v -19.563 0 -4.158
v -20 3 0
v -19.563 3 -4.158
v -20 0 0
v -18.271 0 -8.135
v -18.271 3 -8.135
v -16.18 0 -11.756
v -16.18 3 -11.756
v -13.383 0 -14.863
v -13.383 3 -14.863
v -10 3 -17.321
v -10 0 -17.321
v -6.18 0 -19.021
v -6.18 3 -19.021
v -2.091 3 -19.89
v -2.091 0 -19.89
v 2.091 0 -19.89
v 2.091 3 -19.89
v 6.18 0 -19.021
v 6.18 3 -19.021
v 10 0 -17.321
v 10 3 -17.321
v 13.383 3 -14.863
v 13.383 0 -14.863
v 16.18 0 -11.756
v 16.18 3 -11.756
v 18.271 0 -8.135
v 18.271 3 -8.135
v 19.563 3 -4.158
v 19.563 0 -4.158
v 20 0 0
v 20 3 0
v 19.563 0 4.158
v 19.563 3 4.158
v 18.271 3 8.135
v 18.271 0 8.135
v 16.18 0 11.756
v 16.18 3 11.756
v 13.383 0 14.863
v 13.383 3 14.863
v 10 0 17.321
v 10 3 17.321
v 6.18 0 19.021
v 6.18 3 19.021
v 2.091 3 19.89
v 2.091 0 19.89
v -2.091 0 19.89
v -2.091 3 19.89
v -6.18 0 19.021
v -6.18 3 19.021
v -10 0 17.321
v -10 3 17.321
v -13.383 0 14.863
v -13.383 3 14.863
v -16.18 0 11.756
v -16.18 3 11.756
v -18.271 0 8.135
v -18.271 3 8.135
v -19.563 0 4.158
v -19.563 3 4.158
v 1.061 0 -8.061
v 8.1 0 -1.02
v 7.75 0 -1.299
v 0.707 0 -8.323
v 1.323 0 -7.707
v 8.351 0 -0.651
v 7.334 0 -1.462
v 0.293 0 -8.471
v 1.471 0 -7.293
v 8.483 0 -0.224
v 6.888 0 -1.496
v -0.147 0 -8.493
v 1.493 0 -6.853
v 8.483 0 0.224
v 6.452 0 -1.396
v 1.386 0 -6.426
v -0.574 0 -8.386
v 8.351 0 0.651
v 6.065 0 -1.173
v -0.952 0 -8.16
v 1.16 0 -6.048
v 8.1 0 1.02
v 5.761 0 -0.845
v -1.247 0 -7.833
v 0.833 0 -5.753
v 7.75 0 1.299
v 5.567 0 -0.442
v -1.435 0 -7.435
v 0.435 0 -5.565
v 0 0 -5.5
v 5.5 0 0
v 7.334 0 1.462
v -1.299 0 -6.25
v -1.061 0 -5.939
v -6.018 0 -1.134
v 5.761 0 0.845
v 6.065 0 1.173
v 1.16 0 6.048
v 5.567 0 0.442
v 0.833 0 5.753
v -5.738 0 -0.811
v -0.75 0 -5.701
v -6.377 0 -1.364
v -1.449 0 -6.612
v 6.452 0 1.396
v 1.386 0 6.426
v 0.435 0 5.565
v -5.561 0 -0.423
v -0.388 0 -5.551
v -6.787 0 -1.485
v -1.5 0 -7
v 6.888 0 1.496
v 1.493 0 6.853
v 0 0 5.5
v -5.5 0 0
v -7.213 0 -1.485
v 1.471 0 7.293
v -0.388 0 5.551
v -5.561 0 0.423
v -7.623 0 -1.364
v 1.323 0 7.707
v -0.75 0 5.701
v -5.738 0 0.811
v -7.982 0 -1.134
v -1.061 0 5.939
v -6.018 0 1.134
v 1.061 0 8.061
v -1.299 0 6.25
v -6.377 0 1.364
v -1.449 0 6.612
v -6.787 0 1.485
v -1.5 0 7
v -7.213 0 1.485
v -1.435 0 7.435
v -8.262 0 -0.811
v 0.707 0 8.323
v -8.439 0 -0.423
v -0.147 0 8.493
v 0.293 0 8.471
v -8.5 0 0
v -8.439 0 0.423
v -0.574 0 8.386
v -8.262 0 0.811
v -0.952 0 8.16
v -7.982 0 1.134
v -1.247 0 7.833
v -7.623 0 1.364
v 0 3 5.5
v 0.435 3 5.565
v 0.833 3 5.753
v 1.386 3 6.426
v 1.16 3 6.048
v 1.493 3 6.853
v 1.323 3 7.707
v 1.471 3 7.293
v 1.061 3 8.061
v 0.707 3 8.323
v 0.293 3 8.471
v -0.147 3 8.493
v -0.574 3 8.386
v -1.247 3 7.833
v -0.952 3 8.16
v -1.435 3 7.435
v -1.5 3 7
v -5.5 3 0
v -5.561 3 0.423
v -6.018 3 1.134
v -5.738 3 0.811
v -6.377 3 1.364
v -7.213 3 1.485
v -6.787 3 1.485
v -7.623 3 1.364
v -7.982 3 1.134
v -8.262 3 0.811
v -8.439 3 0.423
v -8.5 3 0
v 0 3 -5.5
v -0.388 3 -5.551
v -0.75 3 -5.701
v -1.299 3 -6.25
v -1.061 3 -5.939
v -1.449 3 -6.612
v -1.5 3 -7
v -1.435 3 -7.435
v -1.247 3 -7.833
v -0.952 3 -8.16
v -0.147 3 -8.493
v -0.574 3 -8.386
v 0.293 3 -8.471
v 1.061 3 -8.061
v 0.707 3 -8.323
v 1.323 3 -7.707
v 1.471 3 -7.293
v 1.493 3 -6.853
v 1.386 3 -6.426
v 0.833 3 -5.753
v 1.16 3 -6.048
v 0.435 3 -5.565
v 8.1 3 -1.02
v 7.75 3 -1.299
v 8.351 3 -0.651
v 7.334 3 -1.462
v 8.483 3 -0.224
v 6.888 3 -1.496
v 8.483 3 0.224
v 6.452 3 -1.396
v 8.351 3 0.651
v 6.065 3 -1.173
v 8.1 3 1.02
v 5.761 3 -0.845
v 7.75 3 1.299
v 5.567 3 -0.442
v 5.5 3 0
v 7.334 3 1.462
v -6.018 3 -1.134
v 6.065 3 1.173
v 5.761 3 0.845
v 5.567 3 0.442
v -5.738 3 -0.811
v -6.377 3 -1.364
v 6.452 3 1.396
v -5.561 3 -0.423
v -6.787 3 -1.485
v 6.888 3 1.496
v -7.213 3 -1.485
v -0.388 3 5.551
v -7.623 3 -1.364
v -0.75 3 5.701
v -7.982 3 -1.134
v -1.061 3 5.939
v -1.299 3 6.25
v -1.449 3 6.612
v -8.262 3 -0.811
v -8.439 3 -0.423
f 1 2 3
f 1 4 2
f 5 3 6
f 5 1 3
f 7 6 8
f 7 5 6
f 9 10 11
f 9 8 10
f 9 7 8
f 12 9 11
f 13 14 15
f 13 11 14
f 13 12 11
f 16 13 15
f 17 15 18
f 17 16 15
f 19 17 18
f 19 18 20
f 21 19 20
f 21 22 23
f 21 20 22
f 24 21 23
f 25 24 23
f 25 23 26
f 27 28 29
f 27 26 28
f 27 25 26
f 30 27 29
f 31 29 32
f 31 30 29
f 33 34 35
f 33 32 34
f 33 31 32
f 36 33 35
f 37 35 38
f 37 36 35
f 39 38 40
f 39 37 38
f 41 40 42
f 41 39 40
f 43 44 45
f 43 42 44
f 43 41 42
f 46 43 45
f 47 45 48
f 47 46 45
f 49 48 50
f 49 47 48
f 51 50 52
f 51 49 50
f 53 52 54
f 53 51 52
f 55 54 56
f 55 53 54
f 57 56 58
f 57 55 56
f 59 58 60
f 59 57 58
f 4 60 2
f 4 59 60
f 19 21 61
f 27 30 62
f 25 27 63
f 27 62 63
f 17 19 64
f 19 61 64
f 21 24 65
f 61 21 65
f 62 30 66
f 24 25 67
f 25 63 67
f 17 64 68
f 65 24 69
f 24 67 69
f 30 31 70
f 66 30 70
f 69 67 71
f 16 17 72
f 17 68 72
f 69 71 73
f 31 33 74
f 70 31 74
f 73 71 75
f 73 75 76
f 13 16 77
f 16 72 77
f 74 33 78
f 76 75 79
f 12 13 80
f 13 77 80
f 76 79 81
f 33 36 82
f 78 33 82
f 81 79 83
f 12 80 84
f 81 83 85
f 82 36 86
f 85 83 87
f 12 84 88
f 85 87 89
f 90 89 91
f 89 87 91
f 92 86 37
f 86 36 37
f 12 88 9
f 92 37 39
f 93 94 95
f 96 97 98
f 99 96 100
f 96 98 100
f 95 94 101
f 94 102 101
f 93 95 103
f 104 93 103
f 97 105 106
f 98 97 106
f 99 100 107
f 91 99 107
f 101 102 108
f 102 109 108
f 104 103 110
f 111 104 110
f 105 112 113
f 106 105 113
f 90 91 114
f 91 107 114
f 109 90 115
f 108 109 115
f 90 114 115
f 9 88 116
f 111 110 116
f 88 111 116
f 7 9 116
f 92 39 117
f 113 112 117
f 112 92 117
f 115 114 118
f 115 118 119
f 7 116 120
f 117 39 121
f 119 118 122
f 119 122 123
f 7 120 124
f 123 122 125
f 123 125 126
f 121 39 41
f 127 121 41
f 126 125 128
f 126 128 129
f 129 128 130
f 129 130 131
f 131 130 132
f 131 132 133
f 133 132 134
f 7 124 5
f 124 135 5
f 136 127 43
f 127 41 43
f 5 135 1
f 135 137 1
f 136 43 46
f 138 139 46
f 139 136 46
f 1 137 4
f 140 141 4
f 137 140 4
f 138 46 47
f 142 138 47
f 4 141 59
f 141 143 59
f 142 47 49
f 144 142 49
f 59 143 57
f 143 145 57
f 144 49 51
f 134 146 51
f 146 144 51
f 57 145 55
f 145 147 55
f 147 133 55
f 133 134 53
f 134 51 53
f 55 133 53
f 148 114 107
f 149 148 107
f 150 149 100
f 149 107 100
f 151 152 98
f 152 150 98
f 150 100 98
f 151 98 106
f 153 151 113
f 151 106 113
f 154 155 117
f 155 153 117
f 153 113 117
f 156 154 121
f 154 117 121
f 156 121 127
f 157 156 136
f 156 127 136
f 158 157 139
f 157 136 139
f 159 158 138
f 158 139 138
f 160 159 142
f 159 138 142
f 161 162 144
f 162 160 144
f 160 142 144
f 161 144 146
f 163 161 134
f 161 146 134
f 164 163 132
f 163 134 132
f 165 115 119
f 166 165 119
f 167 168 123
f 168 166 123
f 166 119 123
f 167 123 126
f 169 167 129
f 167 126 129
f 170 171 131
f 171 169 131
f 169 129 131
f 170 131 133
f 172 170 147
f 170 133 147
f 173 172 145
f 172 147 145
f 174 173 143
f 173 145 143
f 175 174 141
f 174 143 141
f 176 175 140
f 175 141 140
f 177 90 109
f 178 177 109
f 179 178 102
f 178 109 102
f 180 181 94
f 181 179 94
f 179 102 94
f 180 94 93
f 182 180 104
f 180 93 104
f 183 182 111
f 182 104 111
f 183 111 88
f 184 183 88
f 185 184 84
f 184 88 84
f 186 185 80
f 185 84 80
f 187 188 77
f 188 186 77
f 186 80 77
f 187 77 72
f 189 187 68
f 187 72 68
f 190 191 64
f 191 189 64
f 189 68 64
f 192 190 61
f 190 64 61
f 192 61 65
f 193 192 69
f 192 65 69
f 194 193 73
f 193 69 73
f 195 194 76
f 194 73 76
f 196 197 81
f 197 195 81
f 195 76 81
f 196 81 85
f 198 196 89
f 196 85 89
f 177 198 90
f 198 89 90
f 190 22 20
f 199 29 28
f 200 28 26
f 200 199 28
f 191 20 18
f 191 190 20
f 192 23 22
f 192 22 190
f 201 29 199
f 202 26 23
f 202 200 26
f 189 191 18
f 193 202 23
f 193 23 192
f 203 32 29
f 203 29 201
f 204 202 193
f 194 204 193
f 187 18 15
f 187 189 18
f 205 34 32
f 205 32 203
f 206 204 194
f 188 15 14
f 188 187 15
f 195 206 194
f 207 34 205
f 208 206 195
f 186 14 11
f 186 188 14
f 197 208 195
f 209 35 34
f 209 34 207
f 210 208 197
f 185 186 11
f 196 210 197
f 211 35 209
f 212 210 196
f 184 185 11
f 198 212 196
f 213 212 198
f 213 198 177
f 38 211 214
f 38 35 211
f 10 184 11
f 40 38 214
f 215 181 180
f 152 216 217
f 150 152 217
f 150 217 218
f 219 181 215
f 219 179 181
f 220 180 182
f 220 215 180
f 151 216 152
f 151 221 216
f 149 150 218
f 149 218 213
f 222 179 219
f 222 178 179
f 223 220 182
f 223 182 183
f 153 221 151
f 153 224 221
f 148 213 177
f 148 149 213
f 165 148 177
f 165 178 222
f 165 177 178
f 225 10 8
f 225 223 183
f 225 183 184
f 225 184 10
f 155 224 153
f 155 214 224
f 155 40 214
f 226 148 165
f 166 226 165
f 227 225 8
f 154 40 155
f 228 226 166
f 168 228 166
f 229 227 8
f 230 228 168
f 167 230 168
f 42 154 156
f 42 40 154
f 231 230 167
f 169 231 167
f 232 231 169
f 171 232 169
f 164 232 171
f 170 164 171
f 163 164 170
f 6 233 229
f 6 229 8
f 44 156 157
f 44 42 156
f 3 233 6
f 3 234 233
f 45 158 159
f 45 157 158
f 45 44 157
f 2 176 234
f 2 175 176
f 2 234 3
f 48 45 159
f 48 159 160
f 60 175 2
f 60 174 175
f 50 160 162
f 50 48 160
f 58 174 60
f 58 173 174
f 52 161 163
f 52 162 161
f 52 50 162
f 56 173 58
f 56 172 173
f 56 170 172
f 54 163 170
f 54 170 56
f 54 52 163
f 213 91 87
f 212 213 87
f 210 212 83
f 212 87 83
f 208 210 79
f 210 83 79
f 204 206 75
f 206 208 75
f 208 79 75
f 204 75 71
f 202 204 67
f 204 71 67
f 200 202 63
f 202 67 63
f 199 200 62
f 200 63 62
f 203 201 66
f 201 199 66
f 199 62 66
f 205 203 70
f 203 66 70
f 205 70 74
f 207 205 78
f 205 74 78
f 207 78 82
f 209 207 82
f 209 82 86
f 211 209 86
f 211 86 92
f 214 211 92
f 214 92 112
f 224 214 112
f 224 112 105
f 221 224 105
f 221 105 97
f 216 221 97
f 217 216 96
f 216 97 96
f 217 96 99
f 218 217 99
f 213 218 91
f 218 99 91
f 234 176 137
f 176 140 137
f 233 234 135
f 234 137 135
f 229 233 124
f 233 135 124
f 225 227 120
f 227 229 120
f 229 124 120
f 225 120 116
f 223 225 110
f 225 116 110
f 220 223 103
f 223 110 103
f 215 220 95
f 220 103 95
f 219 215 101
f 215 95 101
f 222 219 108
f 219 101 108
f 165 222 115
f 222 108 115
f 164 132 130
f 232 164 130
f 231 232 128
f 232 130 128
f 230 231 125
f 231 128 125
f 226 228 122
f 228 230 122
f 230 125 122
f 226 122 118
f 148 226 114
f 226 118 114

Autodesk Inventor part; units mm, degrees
ref_plane "YZ Plane" through (0, 0, 0) normal (1, 0, 0) x (0, 1, 0)
ref_plane "XZ Plane" through (0, 0, 0) normal (0, 1, 0) x (-1, 0, 0)
ref_plane "XY Plane" through (0, 0, 0) normal (0, 0, 1) x (1, 0, 0)
sketch "Sketch1" plane through (0, 0, 0) normal (0, 1, 0) x (-1, 0, 0)
  circle A0 centre (0, 0) radius 20
  line L0 (0, 0) -> (0, 7)
  line L1 (0, 0) -> (-7, 0)
  line L2 (0, 0) -> (0, -7)
  line L3 (0, 0) -> (7, 0)
  circle A1 centre (-7, 0) radius 1.5
  circle A2 centre (0, 7) radius 1.5
  circle A3 centre (0, -7) radius 1.5
  circle A4 centre (7, 0) radius 1.5
  dimension "d0" = 40
  dimension "d1" = 7
  dimension "d2" = 7
  dimension "d3" = 7
  dimension "d4" = 7
  dimension "d5" = 3
  dimension "d6" = 3
  dimension "d8" = 3
  dimension "d11" = 3
extrude "Extrusion2" add sketch "Sketch1" along normal blind 3
properties part number "Wrist Sprocket"
